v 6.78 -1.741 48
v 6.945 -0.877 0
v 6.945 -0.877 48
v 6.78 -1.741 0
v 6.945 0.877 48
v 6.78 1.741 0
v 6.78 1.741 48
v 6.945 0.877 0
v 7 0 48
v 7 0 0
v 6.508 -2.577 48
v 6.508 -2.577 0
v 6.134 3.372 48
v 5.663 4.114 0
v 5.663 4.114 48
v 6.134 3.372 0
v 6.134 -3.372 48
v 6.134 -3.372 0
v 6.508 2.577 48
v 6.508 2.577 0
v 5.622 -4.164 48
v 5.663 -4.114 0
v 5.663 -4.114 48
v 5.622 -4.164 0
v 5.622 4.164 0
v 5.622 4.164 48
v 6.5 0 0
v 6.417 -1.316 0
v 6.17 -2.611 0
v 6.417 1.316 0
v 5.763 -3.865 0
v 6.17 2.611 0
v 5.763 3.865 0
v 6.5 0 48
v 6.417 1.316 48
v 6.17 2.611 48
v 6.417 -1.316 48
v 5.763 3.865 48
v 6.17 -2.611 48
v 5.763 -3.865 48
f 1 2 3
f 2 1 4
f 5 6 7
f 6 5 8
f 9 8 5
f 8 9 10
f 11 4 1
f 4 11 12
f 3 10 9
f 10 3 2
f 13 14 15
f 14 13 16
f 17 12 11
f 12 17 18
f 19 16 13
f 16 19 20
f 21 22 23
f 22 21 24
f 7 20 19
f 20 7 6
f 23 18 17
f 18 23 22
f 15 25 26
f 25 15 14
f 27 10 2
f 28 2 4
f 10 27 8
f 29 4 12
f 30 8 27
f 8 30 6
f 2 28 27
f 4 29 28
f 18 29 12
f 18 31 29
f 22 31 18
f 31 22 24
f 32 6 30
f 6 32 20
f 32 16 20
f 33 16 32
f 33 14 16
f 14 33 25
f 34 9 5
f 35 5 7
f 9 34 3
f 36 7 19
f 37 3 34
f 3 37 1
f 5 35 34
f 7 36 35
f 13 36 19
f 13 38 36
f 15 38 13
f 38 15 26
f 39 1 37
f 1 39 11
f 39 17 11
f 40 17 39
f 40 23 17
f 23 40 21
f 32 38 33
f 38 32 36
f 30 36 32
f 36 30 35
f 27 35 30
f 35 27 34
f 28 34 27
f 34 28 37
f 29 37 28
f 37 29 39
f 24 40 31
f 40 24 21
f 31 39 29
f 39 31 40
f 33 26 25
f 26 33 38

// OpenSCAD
$fn = 50;


difference() {
	union() {
		cylinder(h = 48, r = 7.0000000000);
		translate(v = [-7.0000000000, 0, 0]) {
			cylinder(h = 48, r = 7.0000000000);
		}
	}
	union() {
		cylinder(h = 48, r = 3.2500000000);
		cylinder(h = 48, r = 1.8000000000);
		cylinder(h = 48, r = 1.8000000000);
		cylinder(h = 48, r = 1.8000000000);
		translate(v = [-11.5000000000, 0, 0]) {
			hull() {
				translate(v = [-3.7500000000, 0.0000000000, 0]) {
					cylinder(h = 48, r = 10.5000000000);
				}
				translate(v = [3.7500000000, 0.0000000000, 0]) {
					cylinder(h = 48, r = 10.5000000000);
				}
				translate(v = [-3.7500000000, -0.0000000000, 0]) {
					cylinder(h = 48, r = 10.5000000000);
				}
				translate(v = [3.7500000000, -0.0000000000, 0]) {
					cylinder(h = 48, r = 10.5000000000);
				}
			}
		}
		translate(v = [-4.0000000000, 0, 0.0000000000]) {
			cylinder(h = 48, r = 10.5000000000);
		}
	}
}
